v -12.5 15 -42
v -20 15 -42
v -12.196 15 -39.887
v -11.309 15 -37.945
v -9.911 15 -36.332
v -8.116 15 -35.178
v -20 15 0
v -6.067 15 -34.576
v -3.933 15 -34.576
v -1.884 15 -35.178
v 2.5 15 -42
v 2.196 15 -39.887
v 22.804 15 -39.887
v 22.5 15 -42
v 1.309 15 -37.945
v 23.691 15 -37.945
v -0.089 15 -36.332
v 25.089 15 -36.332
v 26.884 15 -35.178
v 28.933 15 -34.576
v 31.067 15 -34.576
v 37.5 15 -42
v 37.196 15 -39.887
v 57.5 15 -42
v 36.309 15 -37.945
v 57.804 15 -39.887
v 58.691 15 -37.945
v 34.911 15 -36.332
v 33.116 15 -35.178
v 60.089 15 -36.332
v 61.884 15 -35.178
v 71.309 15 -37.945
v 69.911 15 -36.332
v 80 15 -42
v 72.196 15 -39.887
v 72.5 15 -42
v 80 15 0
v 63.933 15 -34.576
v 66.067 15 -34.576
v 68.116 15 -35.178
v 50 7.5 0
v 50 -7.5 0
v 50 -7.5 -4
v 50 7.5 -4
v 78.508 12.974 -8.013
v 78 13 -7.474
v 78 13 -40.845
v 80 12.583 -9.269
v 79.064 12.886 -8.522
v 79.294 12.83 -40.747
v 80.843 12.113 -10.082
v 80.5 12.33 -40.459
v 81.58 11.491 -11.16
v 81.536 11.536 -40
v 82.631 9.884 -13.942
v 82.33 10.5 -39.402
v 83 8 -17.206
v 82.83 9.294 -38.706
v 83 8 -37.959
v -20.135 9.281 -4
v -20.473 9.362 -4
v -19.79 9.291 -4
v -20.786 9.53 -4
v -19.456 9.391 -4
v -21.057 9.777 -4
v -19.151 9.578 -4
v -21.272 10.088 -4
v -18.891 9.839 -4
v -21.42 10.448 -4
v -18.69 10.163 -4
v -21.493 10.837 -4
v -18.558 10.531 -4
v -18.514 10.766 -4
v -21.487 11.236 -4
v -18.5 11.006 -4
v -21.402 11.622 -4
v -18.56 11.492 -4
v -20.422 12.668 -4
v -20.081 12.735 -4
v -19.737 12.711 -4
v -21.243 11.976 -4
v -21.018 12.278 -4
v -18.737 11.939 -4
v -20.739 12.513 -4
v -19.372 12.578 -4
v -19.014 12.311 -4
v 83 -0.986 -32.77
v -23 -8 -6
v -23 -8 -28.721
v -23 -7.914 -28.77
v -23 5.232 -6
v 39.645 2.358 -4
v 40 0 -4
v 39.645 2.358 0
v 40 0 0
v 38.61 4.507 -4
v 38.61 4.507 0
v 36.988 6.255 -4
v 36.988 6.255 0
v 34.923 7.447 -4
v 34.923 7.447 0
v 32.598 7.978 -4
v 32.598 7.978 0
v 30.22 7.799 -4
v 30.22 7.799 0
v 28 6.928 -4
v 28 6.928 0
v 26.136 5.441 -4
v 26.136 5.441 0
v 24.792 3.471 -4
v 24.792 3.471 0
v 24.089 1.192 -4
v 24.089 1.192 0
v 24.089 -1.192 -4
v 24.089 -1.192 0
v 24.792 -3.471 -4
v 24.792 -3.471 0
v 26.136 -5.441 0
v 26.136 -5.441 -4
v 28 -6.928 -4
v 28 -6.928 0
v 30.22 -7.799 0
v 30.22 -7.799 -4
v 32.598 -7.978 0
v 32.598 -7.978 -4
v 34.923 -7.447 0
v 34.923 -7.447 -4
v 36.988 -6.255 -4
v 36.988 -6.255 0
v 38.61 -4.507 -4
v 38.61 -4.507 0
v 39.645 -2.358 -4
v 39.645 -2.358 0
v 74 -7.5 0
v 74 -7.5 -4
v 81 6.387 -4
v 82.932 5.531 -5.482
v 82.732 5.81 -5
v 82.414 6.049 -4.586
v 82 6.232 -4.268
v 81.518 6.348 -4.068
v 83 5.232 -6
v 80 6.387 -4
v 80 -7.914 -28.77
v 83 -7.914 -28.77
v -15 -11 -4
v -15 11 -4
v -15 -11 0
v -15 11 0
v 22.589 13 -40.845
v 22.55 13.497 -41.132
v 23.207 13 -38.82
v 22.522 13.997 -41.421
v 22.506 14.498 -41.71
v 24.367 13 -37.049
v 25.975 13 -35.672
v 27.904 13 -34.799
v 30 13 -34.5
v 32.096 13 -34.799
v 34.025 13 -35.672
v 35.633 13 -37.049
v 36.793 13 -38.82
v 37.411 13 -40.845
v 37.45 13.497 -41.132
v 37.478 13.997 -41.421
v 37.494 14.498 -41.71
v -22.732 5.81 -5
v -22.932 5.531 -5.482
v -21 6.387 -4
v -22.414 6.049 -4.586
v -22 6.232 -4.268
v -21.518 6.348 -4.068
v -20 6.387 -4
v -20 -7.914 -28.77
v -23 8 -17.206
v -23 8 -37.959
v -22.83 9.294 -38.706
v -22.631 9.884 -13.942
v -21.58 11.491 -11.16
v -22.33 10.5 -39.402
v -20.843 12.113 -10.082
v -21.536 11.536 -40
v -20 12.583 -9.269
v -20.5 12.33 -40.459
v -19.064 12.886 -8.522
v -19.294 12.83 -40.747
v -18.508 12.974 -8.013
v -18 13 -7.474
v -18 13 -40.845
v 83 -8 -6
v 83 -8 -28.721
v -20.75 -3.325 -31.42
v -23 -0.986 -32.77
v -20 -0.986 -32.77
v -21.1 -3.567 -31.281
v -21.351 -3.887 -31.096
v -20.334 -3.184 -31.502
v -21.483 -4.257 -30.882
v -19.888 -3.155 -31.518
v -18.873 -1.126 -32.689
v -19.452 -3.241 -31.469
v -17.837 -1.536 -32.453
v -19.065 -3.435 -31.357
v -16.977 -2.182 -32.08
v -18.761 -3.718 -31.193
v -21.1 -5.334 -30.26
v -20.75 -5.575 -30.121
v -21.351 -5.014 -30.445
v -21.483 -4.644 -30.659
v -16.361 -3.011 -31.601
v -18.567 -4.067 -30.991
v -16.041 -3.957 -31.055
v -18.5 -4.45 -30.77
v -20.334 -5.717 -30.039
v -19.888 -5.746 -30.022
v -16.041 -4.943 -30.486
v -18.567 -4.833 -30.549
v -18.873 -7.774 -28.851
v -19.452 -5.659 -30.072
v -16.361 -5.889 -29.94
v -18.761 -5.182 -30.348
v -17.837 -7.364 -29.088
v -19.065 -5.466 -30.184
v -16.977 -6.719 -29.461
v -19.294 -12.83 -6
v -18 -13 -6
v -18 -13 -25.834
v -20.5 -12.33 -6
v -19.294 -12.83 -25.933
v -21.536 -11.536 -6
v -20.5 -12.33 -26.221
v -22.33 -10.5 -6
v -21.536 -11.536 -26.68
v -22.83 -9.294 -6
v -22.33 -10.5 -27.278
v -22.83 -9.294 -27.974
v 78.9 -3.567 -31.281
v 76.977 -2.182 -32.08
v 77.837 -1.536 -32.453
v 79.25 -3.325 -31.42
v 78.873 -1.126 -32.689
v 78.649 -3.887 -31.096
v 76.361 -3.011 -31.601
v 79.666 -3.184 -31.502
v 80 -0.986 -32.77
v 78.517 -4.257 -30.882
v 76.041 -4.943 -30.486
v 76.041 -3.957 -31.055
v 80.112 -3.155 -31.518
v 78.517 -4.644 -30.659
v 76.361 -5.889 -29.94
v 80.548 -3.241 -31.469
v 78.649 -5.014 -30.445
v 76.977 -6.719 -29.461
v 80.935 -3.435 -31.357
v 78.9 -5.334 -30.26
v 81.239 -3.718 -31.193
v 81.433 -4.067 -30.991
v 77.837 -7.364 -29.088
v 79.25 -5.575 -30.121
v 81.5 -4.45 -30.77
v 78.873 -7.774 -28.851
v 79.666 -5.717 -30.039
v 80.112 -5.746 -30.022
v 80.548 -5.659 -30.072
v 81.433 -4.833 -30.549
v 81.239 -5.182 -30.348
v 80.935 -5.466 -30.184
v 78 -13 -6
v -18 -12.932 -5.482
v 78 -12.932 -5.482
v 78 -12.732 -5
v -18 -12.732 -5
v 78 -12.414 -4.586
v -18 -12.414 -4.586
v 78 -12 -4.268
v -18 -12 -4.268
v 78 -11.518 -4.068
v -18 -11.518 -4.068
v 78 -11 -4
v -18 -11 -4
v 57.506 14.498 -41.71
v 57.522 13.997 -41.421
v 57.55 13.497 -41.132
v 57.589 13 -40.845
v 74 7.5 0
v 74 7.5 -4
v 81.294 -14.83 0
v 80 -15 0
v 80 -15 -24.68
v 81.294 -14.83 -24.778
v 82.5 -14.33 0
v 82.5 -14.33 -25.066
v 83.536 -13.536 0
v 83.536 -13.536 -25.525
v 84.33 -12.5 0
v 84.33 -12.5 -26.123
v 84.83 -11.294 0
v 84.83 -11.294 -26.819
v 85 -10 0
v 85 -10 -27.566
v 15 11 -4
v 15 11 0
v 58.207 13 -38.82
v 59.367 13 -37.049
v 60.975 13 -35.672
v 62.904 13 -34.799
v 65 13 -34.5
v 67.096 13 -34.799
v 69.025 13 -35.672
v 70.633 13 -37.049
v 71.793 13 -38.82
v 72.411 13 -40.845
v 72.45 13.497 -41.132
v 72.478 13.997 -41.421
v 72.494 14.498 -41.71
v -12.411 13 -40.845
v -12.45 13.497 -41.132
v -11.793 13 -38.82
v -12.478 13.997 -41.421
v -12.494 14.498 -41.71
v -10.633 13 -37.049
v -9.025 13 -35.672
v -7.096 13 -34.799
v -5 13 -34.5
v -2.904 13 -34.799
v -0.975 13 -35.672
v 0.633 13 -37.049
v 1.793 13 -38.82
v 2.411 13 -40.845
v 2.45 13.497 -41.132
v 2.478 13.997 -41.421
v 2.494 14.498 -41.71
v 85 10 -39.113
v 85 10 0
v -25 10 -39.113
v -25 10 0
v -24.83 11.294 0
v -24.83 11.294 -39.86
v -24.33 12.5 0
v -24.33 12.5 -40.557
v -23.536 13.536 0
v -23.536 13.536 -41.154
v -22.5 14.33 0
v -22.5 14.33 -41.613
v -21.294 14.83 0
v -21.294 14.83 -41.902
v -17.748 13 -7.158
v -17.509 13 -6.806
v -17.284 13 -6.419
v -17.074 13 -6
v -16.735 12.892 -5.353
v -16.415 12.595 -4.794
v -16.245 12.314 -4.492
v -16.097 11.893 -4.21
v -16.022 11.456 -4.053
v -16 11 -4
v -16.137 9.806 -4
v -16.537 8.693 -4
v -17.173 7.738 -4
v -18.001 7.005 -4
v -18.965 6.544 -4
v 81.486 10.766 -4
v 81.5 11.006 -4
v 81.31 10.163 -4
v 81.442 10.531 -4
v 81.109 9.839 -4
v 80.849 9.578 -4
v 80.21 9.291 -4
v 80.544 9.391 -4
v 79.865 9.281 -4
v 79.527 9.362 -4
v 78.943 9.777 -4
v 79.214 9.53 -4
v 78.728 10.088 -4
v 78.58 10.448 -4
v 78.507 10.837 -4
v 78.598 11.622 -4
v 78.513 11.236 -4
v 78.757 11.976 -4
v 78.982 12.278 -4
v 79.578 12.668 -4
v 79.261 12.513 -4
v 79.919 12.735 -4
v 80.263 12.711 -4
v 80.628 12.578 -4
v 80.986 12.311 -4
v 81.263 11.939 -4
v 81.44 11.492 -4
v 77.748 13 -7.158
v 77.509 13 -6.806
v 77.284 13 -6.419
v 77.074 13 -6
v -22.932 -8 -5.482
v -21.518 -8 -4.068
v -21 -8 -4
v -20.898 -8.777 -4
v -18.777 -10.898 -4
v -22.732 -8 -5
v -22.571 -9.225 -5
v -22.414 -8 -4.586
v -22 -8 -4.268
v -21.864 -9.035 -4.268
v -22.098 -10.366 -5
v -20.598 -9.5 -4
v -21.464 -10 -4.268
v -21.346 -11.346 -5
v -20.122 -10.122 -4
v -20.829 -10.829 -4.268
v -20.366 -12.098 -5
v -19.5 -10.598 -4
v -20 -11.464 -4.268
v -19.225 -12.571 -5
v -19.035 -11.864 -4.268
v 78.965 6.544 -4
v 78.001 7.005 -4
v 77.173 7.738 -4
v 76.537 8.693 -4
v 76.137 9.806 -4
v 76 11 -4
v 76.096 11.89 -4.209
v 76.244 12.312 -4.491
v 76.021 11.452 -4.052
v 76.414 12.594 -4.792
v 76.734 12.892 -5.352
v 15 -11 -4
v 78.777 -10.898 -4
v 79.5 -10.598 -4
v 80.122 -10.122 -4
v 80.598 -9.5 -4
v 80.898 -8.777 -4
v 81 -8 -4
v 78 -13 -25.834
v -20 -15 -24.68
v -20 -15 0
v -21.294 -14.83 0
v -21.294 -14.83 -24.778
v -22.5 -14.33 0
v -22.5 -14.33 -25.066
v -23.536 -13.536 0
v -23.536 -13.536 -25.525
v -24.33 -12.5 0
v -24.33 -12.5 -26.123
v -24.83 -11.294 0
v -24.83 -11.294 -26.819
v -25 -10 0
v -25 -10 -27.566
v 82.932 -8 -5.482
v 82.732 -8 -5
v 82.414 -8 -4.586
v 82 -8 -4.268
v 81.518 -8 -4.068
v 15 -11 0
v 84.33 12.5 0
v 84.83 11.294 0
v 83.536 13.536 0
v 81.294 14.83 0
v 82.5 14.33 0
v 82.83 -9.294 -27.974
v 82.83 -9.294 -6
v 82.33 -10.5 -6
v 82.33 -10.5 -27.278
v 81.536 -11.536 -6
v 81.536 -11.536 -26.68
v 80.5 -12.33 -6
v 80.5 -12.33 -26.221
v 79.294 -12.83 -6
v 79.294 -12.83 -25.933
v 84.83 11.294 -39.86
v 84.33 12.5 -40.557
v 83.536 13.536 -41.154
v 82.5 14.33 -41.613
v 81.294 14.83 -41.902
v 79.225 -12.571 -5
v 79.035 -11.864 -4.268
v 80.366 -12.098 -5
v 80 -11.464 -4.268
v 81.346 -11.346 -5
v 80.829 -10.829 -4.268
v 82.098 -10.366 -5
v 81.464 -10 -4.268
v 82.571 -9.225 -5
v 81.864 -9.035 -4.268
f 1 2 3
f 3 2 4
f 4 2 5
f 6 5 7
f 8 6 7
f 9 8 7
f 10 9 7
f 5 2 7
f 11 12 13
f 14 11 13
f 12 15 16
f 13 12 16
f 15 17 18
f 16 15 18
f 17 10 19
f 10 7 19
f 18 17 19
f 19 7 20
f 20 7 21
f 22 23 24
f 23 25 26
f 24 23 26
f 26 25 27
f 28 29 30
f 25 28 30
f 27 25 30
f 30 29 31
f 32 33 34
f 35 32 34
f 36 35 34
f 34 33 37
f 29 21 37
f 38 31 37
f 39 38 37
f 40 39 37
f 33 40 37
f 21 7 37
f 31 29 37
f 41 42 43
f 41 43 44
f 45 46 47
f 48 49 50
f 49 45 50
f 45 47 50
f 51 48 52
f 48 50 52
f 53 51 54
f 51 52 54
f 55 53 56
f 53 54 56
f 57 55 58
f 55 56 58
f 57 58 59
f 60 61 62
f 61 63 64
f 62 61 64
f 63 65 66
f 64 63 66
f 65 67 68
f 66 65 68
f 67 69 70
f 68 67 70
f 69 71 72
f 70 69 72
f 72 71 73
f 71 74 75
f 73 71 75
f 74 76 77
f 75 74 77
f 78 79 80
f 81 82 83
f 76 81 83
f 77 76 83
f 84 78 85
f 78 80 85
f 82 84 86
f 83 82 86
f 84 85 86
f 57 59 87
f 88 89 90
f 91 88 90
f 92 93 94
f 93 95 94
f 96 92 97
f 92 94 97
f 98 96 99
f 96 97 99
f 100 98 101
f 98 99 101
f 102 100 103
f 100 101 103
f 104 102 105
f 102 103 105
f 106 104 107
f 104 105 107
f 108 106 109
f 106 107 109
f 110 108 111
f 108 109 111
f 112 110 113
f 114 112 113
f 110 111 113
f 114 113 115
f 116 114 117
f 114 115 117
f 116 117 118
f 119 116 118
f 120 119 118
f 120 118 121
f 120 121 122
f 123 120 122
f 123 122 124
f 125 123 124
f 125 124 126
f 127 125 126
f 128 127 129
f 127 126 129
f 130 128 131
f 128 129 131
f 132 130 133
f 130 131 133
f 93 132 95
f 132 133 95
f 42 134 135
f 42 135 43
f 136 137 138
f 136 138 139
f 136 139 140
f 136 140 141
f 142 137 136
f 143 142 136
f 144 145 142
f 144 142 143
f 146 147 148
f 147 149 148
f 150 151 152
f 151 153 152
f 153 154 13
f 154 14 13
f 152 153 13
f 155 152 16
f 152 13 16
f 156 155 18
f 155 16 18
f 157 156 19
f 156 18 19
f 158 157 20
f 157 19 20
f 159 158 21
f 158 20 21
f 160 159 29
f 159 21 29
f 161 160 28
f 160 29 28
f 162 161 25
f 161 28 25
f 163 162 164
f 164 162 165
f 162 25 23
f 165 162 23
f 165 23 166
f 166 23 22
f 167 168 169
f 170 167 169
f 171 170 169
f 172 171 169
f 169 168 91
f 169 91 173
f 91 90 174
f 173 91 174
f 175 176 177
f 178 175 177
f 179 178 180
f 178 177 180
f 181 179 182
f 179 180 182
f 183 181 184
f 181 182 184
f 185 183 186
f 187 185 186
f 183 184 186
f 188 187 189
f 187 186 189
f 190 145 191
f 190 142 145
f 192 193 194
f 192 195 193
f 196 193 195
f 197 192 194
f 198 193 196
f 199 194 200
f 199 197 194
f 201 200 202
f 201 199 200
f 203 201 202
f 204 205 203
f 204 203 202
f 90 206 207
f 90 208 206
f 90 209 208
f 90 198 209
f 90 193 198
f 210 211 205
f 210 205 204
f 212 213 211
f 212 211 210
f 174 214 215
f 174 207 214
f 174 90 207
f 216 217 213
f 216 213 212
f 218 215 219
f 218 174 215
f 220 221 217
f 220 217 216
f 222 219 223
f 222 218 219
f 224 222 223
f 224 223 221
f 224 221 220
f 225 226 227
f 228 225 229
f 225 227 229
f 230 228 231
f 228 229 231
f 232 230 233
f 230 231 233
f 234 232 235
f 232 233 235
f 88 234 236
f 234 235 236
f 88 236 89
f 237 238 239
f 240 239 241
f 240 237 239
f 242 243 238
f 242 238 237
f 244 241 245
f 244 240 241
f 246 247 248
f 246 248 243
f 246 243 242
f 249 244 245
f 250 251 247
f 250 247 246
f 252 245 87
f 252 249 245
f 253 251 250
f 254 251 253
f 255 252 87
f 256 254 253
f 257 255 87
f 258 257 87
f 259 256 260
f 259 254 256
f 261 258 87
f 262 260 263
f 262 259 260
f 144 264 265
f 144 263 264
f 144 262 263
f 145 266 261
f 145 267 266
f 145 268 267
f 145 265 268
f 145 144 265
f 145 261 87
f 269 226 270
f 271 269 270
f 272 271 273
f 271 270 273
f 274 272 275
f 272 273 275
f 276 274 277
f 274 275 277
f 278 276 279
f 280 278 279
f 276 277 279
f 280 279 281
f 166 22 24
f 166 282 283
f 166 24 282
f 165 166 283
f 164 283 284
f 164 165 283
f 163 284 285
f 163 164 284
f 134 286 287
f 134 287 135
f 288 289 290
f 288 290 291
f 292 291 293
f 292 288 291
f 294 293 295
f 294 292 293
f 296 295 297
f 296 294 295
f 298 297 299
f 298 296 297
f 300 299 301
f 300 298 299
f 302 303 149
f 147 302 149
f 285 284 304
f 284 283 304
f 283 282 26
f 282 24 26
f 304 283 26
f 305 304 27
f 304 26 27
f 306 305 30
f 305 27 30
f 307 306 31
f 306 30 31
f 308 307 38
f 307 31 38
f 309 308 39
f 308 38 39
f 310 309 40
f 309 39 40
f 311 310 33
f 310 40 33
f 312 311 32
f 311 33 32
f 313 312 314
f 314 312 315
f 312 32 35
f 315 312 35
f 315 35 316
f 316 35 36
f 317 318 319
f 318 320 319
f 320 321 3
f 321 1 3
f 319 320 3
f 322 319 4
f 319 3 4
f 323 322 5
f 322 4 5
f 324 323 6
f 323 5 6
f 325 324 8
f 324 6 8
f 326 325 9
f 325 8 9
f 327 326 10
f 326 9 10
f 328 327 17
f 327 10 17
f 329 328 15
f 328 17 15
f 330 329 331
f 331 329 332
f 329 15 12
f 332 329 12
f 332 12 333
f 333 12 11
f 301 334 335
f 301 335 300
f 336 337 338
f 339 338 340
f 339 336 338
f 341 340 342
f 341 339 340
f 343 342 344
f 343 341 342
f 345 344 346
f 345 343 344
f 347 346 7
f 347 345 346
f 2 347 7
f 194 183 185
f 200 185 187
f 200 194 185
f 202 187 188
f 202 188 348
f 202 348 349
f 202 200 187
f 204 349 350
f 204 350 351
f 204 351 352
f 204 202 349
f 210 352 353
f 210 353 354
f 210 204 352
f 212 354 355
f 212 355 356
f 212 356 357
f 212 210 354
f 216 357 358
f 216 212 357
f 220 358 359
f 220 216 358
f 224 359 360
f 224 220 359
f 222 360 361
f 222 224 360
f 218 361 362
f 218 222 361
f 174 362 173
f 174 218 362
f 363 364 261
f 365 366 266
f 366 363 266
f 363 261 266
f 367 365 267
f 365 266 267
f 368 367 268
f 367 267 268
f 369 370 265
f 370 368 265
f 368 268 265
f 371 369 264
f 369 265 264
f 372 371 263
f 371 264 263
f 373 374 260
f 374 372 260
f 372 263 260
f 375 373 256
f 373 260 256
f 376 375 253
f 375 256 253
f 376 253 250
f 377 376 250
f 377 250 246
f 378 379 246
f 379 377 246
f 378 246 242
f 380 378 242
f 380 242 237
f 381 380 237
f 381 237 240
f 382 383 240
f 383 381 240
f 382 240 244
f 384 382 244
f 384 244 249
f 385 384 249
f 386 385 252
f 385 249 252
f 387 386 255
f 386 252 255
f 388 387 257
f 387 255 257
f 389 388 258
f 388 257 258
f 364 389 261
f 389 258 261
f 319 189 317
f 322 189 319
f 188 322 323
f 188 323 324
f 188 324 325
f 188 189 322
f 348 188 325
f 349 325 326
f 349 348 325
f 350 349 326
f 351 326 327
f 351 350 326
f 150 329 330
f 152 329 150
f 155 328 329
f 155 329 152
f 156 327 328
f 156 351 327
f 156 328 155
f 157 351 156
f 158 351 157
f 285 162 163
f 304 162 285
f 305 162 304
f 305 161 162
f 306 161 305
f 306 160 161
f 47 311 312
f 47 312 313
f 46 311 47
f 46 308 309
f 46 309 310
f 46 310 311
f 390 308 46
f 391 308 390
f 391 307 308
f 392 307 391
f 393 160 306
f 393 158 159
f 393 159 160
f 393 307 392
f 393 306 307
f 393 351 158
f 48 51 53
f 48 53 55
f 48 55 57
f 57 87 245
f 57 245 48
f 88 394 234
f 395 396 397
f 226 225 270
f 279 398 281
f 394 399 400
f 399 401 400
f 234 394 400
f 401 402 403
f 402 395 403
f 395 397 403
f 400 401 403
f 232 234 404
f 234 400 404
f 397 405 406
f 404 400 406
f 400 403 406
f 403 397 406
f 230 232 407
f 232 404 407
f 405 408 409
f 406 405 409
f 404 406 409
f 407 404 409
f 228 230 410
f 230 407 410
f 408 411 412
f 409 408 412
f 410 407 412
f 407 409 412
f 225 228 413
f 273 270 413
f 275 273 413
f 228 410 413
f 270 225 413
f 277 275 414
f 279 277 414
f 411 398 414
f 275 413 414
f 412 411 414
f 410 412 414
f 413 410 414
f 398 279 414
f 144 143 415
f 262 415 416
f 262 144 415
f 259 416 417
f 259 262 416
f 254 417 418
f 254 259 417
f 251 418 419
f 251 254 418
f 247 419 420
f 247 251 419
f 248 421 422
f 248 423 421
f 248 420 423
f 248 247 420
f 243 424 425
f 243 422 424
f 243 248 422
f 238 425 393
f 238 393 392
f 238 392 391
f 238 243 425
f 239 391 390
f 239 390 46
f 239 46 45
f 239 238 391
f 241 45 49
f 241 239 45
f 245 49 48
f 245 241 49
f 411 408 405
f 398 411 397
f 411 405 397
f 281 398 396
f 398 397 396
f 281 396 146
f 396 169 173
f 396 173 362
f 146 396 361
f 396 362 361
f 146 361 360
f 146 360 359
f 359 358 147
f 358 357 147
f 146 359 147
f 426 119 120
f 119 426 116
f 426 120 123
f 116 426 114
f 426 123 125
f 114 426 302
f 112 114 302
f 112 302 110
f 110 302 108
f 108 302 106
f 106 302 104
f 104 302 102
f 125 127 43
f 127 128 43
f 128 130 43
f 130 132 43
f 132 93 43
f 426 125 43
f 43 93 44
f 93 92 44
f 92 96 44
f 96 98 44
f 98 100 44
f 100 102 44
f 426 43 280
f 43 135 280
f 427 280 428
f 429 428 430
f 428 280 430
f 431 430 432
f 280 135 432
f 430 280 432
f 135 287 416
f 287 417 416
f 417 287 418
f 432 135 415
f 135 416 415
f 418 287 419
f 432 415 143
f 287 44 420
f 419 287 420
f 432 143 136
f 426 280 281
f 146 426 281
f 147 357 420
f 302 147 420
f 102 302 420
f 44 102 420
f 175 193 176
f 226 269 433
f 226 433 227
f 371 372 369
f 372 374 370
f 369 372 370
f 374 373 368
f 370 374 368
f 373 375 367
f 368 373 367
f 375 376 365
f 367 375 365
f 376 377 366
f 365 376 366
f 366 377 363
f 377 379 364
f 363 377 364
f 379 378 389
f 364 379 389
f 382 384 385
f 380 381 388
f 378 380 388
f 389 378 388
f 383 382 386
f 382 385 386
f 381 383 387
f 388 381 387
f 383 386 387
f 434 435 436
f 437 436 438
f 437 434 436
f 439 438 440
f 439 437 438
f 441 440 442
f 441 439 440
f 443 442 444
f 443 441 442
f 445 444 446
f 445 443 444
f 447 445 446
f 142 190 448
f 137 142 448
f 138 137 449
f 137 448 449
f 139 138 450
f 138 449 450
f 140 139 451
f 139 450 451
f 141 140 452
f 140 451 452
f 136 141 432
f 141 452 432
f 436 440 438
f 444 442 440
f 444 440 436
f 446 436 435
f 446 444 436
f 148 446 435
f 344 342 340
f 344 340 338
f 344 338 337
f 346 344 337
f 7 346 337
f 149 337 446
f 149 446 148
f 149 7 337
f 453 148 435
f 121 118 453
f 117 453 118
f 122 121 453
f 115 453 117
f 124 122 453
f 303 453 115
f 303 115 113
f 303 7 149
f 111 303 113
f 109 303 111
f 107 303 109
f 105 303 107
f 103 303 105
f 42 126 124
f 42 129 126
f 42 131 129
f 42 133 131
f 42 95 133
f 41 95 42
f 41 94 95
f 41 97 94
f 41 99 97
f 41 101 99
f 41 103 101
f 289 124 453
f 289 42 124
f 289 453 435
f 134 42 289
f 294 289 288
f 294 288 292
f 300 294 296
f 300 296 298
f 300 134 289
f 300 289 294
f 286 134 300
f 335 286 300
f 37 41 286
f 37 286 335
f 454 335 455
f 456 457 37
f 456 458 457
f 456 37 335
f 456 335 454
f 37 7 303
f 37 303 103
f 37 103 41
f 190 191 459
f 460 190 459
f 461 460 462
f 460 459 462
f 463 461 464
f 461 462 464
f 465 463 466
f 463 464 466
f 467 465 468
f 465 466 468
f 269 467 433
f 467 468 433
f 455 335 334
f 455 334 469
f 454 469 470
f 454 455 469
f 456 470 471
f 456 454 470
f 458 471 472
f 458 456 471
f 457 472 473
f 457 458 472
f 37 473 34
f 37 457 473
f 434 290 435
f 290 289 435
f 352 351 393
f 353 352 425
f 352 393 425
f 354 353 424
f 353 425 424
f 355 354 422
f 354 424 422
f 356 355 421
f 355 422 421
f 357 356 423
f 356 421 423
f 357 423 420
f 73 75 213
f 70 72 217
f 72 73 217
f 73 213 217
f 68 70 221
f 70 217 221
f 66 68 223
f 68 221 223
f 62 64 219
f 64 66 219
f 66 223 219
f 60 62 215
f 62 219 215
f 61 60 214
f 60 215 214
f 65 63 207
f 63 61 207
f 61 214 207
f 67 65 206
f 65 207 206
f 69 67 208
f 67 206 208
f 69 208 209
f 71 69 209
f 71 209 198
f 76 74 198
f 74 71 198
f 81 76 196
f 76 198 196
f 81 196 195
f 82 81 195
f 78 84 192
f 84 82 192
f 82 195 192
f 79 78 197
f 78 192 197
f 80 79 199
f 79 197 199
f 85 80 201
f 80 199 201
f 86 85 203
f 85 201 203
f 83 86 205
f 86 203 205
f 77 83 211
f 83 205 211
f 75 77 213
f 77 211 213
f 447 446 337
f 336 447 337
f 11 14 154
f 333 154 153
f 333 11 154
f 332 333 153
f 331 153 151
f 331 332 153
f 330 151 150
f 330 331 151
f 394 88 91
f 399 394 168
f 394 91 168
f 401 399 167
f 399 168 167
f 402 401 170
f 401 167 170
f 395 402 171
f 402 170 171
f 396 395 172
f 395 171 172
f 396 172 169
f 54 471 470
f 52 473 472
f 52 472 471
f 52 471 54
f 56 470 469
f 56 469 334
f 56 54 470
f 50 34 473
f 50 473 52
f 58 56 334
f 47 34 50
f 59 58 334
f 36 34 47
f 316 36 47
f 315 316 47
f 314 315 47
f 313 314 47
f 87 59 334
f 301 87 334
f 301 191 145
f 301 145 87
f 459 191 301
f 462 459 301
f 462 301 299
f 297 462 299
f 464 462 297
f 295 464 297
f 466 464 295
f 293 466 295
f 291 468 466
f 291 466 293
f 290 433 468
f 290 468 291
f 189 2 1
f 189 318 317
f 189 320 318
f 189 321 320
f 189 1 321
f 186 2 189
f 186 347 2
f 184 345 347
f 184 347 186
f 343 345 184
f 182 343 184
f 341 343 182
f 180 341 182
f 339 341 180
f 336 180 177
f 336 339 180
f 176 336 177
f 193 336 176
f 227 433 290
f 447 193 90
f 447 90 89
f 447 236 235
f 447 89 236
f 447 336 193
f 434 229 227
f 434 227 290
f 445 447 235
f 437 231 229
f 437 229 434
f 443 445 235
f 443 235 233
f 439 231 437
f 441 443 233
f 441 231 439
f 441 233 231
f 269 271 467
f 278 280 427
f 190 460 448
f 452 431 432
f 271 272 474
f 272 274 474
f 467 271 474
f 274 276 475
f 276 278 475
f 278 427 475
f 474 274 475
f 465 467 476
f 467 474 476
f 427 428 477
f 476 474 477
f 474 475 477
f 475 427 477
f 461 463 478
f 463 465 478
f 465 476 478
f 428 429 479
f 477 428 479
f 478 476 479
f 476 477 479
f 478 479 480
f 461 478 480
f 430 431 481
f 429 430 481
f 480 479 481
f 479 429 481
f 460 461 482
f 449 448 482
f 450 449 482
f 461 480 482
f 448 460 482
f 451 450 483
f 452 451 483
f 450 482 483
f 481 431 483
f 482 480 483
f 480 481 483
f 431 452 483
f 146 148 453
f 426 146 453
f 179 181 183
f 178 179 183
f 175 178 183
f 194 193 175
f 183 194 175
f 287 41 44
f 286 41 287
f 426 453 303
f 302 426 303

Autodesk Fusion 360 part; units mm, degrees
sketch "Sketch1" plane through (0, 0, 0) normal (0, 0, 1) x (1, 0, 0)
  line L0 (-15, -11) -> (15, -11)
  line L1 (15, -11) -> (15, 11)
  line L2 (15, 11) -> (-15, 11)
  line L3 (-15, 11) -> (-15, -11)
  line L4 (-15, -11) -> (15, 11) construction
  line L5 (15, -11) -> (-15, 11) construction
  circle A0 centre (32, 0) radius 8
  line L6 (0, 0) -> (32, 0) construction
  line L7 (85, -15) -> (-25, -15)
  line L8 (-25, -15) -> (-25, 15)
  line L9 (-25, 15) -> (85, 15)
  line L10 (85, 15) -> (85, -15)
  line L11 (85, -15) -> (-25, 15) construction
  line L12 (-25, -15) -> (85, 15) construction
  line L13 (83, -13) -> (-23, -13)
  line L14 (-23, -13) -> (-23, 13)
  line L15 (-23, 13) -> (83, 13)
  line L16 (83, 13) -> (83, -13)
  line L17 (74, -7.5) -> (50, -7.5)
  line L18 (50, -7.5) -> (50, 7.5)
  line L19 (50, 7.5) -> (74, 7.5)
  line L20 (74, 7.5) -> (74, -7.5)
  line L21 (74, -7.5) -> (50, 7.5) construction
  line L22 (50, -7.5) -> (74, 7.5) construction
  line L23 (24, 13) -> (24, -13) construction
  line L24 (40, 13) -> (40, -13) construction
  line L25 (32, 0) -> (62, 0) construction
  point P0 (30, 0)
  point P1 (62, 0)
  dimension "d1" = 30
  dimension "d2" = 22
  dimension "d3" = 16
  dimension "d5" = 30
  dimension "d6" = 10
  dimension "d7" = 2
  dimension "d12" = 24
  dimension "d13" = 15
  dimension "d14" = 9
  dimension "d15" = 10
  dimension "d16" = 9
  dimension "d30" = 110
extrude "Extrude2" add sketch "Sketch1" against normal blind 4 contours L7 L8 L9 L10 | L13 L14 L15 L16 makes body 1
extrude "Extrude3" add sketch "Sketch1" against normal blind 42 contours L7 L8 L9 L10 bodies 1
extrude "Extrude4" add sketch "Sketch1" against normal blind 26.4 separate body contours L0 L1 L2 L3 makes body 2
sketch "Sketch4" plane through (-25, 0, 0) normal (-1, 0, 0) x (0, -1, 0)
  line L0 (15, 0) -> (-15, 0)
  line L1 (-15, 0) -> (-15, -42)
  line L2 (-15, -42) -> (15, -42)
  line L3 (15, -42) -> (15, 0)
  line L4 (-15, -42) -> (15, -24.6795)
  dimension "d24" = 60
extrude "Extrude5" cut sketch "Sketch4" against normal through all contours L2 L3 L4 bodies 1 2
sketch "Sketch5" plane through (0, -14.4365, -25.0048) normal (0, -0.5, -0.866) x (1, 0, 0)
  line L0 (-23, -1.6588) -> (83, -1.6588)
  line L1 (83, -1.6588) -> (83, -31.681)
  line L2 (83, -31.681) -> (-23, -31.681)
  line L3 (-23, -31.681) -> (-23, -1.6588)
  line L4 (85, -33.9904) -> (85, 0.6506)
  line L5 (85, 0.6506) -> (-25, 0.6506)
  line L6 (-25, 0.6506) -> (-25, -33.9904)
  line L7 (-25, -33.9904) -> (85, -33.9904)
  line L8 (-25, -11.5312) -> (85, -11.5312) construction
  circle A0 centre (-20, -11.5312) radius 1.5
  circle A1 centre (80, -11.5312) radius 1.5
  circle A2 centre (-20, -11.5312) radius 4
  circle A3 centre (80, -11.5312) radius 4
  line L9 (-25, -7.5312) -> (-20, -7.5312)
  line L10 (-25, -15.5312) -> (-20, -15.5312)
  line L11 (85, -7.5312) -> (80, -7.5312)
  line L12 (85, -15.5312) -> (80, -15.5312)
  dimension "d26" = 3
  dimension "d27" = 3
  dimension "d28" = 100
  dimension "d29" = 5
  dimension "d31" = 5
  dimension "d32" = 8
  dimension "d33" = 8
extrude "Extrude6" add sketch "Sketch5" against normal blind 31.9 contours L3 A2 L9 | L1 A3 L11 | L3 A2 | L1 A3 | L3 A2 L10 | L1 A3 L12 picked at (-22.5, -11.5312) picked at (82.5, -11.5312) bodies 1
fillet "Fillet3" radius 5 4 edges at (83, 13, -24.6955) (83, -13, -14.9171) (-23, 13, -24.6955) (-23, -13, -14.9171) on bodies 1
fillet "Fillet1" radius 2 2 edges at (30, -13, -4) (30, 13, -4) on bodies 1
sketch "Sketch6" plane through (0, 15, 0) normal (0, 1, 0) x (-1, 0, 0)
  line L0 (25, 0) -> (-85, 0)
  line L1 (-85, 0) -> (-85, -42)
  line L2 (-85, -42) -> (25, -42)
  line L3 (25, -42) -> (25, 0)
  circle A0 centre (-65, -42) radius 7.5
  circle A1 centre (-30, -42) radius 7.5
  circle A2 centre (5, -42) radius 7.5
  dimension "d39" = 15
  dimension "d40" = 15
  dimension "d41" = 15
  dimension "d42" = 20
  dimension "d43" = 20
extrude "Extrude8" cut sketch "Sketch6" against normal blind 5 contours L2 A2 | L2 A0 | L2 A1 picked at (5.1868, -39.507) picked at (-65.5284, -39.1901) picked at (-29.8132, -39.507) bodies 1
fillet "Fillet2" radius 5 4 edges at (-25, -15, -12.3397) (-25, 15, -21) (85, -15, -12.3397) (85, 15, -21) on bodies 1
hidden bodies 2
